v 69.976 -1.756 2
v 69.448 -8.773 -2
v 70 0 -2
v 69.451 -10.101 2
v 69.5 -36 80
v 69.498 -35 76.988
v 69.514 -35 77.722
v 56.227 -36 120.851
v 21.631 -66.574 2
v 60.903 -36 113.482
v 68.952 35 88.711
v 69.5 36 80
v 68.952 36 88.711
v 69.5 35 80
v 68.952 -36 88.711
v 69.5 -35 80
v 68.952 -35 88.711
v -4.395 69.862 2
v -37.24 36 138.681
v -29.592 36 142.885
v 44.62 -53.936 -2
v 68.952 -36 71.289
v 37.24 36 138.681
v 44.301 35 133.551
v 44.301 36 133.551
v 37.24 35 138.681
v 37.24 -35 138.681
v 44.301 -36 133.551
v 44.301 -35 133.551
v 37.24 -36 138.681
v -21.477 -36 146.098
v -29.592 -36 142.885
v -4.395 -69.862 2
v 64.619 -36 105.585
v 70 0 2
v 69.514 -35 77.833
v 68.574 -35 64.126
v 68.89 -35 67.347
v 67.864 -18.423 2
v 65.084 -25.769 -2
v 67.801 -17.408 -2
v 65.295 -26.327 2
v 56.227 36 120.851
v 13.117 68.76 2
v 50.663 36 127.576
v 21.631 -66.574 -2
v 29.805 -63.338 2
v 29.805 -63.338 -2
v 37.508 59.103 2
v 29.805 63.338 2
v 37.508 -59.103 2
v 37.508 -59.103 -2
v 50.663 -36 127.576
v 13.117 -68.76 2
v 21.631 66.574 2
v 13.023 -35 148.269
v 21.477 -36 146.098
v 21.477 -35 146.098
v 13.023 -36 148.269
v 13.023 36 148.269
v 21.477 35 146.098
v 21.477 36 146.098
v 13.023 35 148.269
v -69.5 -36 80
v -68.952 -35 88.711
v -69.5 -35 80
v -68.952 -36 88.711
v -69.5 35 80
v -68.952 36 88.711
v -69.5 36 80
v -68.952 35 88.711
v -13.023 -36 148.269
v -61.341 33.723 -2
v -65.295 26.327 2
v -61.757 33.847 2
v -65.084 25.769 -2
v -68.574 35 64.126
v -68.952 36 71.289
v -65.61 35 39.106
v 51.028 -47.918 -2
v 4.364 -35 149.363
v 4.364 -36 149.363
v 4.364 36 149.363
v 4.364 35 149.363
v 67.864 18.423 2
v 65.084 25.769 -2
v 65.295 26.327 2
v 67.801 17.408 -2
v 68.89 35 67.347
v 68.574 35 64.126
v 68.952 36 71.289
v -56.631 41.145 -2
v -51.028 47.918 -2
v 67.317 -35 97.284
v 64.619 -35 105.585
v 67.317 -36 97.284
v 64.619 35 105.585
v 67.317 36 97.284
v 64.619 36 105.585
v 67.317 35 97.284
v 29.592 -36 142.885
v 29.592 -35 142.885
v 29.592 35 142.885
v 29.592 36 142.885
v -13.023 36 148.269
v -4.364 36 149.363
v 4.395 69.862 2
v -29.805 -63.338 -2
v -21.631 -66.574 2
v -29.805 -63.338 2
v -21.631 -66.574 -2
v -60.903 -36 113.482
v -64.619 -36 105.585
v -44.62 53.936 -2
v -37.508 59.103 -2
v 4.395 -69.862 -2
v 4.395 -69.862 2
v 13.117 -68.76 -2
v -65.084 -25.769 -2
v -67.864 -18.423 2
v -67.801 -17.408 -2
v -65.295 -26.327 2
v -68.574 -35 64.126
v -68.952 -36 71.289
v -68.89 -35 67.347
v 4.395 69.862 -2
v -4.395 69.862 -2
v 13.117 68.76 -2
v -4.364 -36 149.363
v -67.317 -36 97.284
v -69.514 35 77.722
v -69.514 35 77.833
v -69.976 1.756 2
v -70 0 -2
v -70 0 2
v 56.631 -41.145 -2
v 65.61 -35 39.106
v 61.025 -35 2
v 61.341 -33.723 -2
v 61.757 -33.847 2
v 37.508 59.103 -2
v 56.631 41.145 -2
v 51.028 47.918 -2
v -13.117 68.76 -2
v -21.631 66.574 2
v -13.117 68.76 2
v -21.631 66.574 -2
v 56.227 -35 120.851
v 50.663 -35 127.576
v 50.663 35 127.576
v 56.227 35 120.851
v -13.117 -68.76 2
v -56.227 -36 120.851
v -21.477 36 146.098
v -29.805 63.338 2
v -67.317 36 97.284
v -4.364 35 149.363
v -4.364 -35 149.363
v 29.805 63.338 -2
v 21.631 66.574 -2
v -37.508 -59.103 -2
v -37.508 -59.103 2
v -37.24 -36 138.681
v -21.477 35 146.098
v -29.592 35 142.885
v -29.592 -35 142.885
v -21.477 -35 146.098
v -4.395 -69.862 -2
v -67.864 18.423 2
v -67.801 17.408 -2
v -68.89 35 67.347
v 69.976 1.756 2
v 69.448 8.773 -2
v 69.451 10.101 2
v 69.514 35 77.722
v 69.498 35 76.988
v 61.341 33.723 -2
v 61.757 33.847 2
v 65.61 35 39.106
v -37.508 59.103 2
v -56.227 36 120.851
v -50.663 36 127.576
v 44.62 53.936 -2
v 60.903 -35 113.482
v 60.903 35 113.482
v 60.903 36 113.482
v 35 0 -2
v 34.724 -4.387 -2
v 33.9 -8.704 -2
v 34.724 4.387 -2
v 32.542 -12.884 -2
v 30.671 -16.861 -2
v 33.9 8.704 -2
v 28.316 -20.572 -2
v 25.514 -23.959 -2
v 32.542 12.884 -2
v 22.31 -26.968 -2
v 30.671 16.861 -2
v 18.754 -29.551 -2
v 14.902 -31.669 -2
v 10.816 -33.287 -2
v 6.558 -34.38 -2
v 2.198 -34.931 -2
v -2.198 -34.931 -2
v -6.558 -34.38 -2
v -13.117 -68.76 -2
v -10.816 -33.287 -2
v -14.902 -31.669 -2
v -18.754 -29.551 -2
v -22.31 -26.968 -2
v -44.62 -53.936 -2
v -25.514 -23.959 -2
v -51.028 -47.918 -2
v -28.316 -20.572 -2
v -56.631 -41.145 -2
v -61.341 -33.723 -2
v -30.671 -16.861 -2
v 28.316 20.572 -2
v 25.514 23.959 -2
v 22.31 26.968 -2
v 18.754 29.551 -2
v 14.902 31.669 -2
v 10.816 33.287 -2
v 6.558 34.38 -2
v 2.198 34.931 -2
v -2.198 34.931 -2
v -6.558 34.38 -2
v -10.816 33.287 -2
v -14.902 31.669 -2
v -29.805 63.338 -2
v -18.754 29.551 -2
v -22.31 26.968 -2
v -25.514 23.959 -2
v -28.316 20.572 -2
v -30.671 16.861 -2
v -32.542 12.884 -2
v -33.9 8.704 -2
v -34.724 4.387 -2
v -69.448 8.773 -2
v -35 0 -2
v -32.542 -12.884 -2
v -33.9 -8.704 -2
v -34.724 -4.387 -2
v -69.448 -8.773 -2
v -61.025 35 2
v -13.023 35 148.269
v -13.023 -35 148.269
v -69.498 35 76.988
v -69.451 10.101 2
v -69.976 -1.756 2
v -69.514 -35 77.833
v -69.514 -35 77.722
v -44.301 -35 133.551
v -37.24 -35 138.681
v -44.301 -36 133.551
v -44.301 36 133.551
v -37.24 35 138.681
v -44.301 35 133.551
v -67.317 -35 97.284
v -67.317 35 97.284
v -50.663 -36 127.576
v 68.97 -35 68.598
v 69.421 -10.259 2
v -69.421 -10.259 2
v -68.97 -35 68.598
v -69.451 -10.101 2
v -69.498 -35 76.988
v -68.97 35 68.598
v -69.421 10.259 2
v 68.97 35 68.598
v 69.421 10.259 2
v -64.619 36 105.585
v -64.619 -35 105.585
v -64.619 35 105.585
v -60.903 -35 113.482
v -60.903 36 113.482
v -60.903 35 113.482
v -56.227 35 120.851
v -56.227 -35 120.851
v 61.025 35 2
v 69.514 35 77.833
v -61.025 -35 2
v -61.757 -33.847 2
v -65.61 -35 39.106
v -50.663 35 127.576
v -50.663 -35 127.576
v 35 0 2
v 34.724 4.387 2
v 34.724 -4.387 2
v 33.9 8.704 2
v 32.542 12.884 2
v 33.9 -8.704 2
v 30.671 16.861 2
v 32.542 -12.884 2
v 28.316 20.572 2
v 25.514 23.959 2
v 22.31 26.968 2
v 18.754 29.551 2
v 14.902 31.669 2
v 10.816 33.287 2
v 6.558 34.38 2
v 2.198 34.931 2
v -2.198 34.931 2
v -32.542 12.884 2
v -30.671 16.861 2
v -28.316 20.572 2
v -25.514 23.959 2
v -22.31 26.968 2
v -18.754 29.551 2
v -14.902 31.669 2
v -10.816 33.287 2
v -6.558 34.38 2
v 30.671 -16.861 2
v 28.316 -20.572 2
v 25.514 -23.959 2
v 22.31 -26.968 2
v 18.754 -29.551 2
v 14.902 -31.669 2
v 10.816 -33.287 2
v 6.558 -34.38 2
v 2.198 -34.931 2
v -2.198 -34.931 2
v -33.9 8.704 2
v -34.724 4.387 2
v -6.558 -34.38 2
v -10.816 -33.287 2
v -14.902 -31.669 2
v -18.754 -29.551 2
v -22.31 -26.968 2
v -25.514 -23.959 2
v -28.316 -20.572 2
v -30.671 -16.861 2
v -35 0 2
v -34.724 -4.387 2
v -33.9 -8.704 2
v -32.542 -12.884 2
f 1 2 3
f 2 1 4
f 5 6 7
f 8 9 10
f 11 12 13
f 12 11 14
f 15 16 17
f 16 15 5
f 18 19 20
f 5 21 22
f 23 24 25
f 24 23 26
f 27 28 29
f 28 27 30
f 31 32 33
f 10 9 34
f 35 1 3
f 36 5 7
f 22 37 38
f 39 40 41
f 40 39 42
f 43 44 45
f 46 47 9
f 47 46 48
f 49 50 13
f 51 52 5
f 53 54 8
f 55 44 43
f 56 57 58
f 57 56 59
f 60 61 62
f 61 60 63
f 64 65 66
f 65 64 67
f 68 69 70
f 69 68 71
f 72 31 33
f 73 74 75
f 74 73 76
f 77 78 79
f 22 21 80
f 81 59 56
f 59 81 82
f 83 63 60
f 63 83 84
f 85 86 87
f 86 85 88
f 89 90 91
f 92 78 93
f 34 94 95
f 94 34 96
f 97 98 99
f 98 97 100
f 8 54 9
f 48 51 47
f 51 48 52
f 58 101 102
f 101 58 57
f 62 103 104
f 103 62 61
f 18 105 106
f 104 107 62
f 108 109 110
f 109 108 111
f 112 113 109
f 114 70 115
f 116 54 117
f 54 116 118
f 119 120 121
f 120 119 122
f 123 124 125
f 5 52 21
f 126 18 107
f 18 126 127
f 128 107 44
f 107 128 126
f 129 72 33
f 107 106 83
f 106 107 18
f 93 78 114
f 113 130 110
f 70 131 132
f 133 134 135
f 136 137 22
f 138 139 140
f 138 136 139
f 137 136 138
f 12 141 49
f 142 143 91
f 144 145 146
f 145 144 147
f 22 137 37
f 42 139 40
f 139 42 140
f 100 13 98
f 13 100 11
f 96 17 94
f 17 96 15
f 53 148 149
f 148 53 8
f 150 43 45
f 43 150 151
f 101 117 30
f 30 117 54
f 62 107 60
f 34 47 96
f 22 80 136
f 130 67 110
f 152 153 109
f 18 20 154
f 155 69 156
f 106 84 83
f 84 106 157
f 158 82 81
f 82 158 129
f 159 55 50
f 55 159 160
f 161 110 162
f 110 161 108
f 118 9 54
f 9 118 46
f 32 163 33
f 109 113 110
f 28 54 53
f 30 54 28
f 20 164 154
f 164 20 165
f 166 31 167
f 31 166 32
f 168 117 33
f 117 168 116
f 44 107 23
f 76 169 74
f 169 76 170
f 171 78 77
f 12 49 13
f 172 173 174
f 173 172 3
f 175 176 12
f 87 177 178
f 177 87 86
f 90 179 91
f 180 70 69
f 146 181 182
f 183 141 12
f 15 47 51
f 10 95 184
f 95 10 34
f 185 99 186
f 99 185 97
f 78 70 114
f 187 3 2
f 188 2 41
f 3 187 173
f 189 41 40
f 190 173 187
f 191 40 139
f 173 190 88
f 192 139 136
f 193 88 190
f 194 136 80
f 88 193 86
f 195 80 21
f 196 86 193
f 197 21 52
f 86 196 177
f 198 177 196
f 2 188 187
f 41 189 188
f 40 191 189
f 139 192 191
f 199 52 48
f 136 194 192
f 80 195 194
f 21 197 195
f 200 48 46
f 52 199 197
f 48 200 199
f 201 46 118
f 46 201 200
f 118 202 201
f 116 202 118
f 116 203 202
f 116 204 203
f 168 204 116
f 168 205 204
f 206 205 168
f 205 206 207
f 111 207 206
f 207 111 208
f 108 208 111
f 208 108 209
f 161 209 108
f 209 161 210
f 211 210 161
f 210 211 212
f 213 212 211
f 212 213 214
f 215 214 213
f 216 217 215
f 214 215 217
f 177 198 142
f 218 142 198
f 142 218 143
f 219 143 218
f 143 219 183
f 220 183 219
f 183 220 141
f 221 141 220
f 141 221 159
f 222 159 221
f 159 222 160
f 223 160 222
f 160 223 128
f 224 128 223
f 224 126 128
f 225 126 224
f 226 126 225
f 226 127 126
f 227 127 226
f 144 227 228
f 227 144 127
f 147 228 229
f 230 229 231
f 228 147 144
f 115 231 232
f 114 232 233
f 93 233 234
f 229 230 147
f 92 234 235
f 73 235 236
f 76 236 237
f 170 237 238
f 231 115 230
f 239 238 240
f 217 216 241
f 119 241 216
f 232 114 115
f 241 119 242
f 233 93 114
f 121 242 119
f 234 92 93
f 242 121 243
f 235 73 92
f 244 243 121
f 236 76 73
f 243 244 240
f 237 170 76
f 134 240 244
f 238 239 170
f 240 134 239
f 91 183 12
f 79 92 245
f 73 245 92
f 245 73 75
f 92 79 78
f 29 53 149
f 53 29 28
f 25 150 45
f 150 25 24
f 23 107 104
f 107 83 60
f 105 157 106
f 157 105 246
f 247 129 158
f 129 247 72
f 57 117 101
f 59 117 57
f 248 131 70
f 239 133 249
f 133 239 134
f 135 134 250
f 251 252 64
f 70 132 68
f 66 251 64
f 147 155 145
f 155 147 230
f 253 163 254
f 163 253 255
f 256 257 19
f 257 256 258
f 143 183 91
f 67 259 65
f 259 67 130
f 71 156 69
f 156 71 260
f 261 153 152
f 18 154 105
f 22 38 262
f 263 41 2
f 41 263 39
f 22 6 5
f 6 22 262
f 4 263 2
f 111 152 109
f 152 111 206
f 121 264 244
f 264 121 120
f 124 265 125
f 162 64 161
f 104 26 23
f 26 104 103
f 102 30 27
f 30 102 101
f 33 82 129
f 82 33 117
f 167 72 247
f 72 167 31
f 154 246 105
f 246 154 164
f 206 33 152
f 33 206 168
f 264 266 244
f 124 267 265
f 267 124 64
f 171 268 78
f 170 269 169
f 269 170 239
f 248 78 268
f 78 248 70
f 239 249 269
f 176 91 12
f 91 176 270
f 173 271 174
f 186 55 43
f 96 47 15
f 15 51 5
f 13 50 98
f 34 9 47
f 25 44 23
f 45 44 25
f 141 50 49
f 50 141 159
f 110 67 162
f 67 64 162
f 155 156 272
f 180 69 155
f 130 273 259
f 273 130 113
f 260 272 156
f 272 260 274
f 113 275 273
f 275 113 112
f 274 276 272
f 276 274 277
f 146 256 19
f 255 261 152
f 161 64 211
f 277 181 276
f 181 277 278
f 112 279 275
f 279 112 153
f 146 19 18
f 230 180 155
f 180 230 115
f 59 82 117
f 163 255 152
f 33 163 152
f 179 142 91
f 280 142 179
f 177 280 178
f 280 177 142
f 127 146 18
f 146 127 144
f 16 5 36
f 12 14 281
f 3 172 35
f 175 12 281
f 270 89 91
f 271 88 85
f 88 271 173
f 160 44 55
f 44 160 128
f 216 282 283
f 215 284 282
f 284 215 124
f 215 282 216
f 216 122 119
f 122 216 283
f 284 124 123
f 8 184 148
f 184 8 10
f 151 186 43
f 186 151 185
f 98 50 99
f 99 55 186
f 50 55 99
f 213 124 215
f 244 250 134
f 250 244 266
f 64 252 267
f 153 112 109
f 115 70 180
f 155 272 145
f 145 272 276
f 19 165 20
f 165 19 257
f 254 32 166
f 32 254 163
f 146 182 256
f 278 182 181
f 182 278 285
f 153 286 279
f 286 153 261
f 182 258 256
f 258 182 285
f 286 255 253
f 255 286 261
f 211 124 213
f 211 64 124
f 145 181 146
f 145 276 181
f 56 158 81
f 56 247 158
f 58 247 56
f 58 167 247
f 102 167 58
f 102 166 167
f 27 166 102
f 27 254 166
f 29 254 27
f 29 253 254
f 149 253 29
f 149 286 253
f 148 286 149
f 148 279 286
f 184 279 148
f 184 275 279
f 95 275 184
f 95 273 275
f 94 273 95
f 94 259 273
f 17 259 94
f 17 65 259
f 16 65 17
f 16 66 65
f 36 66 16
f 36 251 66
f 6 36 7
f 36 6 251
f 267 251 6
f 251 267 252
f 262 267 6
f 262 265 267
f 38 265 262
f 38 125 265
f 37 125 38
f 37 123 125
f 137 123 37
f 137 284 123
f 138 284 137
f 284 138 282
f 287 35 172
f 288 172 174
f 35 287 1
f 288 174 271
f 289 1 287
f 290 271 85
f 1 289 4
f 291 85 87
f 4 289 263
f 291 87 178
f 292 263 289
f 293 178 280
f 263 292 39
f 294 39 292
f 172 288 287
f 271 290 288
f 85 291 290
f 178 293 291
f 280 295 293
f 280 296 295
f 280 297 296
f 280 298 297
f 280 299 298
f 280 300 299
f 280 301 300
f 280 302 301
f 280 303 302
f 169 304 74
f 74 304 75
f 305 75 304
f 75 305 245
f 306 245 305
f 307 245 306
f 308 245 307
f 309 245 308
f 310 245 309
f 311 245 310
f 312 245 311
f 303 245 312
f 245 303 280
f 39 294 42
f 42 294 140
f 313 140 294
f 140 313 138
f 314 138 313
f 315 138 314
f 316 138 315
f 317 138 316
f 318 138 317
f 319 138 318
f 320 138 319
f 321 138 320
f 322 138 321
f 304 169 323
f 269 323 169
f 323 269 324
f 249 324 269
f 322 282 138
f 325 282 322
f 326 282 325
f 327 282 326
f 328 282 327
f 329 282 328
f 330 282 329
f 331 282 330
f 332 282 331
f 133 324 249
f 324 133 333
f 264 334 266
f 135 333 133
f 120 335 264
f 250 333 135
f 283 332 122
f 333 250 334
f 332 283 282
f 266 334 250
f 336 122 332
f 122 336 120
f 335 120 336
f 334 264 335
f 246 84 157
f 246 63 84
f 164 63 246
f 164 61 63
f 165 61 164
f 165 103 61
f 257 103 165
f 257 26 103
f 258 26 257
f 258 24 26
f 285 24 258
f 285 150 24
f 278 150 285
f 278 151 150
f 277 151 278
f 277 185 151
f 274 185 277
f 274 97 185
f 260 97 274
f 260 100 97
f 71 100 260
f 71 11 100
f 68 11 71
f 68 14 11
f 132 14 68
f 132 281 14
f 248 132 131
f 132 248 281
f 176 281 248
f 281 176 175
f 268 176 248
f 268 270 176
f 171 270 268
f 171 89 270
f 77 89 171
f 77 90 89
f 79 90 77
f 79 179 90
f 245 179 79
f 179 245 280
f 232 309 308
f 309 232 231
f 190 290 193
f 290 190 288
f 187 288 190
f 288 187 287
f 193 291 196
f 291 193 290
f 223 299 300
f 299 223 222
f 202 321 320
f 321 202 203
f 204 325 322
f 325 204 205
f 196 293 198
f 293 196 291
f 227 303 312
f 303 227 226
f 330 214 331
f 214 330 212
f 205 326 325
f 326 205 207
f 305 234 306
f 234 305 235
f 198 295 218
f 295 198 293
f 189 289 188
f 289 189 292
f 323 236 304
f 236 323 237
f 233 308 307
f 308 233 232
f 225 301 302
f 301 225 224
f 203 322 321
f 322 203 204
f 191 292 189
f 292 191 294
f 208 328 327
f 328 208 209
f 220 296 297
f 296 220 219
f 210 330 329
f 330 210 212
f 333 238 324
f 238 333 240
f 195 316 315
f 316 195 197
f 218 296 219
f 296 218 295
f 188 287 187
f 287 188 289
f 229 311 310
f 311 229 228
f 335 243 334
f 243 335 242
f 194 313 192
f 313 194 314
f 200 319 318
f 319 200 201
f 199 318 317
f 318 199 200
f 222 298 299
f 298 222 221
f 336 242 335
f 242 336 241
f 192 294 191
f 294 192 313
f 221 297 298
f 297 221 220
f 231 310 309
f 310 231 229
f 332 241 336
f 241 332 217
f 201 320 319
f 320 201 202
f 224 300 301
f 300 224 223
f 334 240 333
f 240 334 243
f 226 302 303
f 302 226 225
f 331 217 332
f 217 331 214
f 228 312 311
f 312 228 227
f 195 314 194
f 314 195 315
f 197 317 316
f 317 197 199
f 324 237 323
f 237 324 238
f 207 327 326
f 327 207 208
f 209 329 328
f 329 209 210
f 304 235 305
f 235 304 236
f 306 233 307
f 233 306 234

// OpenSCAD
//base radius
r=70;

//base height
b=4;

//height
h=150;

//thickness
t=70;

// translate height
y=80;

difference(){
hull(){
cylinder(h = b, r=r, center=true, $fn=50); //bottom
translate([0,0,y])rotate([90,0,0])cylinder(h = t+2, r=r-0.5, center=true, $fn=50); //top
}
rotate([0,0,90])translate([0,0,h/2+b/2])cube(size = [t,2*t,h], center = true);
cylinder(h=b+1, r=r/2, center=true, $fn=50); //cut out bottom
}
